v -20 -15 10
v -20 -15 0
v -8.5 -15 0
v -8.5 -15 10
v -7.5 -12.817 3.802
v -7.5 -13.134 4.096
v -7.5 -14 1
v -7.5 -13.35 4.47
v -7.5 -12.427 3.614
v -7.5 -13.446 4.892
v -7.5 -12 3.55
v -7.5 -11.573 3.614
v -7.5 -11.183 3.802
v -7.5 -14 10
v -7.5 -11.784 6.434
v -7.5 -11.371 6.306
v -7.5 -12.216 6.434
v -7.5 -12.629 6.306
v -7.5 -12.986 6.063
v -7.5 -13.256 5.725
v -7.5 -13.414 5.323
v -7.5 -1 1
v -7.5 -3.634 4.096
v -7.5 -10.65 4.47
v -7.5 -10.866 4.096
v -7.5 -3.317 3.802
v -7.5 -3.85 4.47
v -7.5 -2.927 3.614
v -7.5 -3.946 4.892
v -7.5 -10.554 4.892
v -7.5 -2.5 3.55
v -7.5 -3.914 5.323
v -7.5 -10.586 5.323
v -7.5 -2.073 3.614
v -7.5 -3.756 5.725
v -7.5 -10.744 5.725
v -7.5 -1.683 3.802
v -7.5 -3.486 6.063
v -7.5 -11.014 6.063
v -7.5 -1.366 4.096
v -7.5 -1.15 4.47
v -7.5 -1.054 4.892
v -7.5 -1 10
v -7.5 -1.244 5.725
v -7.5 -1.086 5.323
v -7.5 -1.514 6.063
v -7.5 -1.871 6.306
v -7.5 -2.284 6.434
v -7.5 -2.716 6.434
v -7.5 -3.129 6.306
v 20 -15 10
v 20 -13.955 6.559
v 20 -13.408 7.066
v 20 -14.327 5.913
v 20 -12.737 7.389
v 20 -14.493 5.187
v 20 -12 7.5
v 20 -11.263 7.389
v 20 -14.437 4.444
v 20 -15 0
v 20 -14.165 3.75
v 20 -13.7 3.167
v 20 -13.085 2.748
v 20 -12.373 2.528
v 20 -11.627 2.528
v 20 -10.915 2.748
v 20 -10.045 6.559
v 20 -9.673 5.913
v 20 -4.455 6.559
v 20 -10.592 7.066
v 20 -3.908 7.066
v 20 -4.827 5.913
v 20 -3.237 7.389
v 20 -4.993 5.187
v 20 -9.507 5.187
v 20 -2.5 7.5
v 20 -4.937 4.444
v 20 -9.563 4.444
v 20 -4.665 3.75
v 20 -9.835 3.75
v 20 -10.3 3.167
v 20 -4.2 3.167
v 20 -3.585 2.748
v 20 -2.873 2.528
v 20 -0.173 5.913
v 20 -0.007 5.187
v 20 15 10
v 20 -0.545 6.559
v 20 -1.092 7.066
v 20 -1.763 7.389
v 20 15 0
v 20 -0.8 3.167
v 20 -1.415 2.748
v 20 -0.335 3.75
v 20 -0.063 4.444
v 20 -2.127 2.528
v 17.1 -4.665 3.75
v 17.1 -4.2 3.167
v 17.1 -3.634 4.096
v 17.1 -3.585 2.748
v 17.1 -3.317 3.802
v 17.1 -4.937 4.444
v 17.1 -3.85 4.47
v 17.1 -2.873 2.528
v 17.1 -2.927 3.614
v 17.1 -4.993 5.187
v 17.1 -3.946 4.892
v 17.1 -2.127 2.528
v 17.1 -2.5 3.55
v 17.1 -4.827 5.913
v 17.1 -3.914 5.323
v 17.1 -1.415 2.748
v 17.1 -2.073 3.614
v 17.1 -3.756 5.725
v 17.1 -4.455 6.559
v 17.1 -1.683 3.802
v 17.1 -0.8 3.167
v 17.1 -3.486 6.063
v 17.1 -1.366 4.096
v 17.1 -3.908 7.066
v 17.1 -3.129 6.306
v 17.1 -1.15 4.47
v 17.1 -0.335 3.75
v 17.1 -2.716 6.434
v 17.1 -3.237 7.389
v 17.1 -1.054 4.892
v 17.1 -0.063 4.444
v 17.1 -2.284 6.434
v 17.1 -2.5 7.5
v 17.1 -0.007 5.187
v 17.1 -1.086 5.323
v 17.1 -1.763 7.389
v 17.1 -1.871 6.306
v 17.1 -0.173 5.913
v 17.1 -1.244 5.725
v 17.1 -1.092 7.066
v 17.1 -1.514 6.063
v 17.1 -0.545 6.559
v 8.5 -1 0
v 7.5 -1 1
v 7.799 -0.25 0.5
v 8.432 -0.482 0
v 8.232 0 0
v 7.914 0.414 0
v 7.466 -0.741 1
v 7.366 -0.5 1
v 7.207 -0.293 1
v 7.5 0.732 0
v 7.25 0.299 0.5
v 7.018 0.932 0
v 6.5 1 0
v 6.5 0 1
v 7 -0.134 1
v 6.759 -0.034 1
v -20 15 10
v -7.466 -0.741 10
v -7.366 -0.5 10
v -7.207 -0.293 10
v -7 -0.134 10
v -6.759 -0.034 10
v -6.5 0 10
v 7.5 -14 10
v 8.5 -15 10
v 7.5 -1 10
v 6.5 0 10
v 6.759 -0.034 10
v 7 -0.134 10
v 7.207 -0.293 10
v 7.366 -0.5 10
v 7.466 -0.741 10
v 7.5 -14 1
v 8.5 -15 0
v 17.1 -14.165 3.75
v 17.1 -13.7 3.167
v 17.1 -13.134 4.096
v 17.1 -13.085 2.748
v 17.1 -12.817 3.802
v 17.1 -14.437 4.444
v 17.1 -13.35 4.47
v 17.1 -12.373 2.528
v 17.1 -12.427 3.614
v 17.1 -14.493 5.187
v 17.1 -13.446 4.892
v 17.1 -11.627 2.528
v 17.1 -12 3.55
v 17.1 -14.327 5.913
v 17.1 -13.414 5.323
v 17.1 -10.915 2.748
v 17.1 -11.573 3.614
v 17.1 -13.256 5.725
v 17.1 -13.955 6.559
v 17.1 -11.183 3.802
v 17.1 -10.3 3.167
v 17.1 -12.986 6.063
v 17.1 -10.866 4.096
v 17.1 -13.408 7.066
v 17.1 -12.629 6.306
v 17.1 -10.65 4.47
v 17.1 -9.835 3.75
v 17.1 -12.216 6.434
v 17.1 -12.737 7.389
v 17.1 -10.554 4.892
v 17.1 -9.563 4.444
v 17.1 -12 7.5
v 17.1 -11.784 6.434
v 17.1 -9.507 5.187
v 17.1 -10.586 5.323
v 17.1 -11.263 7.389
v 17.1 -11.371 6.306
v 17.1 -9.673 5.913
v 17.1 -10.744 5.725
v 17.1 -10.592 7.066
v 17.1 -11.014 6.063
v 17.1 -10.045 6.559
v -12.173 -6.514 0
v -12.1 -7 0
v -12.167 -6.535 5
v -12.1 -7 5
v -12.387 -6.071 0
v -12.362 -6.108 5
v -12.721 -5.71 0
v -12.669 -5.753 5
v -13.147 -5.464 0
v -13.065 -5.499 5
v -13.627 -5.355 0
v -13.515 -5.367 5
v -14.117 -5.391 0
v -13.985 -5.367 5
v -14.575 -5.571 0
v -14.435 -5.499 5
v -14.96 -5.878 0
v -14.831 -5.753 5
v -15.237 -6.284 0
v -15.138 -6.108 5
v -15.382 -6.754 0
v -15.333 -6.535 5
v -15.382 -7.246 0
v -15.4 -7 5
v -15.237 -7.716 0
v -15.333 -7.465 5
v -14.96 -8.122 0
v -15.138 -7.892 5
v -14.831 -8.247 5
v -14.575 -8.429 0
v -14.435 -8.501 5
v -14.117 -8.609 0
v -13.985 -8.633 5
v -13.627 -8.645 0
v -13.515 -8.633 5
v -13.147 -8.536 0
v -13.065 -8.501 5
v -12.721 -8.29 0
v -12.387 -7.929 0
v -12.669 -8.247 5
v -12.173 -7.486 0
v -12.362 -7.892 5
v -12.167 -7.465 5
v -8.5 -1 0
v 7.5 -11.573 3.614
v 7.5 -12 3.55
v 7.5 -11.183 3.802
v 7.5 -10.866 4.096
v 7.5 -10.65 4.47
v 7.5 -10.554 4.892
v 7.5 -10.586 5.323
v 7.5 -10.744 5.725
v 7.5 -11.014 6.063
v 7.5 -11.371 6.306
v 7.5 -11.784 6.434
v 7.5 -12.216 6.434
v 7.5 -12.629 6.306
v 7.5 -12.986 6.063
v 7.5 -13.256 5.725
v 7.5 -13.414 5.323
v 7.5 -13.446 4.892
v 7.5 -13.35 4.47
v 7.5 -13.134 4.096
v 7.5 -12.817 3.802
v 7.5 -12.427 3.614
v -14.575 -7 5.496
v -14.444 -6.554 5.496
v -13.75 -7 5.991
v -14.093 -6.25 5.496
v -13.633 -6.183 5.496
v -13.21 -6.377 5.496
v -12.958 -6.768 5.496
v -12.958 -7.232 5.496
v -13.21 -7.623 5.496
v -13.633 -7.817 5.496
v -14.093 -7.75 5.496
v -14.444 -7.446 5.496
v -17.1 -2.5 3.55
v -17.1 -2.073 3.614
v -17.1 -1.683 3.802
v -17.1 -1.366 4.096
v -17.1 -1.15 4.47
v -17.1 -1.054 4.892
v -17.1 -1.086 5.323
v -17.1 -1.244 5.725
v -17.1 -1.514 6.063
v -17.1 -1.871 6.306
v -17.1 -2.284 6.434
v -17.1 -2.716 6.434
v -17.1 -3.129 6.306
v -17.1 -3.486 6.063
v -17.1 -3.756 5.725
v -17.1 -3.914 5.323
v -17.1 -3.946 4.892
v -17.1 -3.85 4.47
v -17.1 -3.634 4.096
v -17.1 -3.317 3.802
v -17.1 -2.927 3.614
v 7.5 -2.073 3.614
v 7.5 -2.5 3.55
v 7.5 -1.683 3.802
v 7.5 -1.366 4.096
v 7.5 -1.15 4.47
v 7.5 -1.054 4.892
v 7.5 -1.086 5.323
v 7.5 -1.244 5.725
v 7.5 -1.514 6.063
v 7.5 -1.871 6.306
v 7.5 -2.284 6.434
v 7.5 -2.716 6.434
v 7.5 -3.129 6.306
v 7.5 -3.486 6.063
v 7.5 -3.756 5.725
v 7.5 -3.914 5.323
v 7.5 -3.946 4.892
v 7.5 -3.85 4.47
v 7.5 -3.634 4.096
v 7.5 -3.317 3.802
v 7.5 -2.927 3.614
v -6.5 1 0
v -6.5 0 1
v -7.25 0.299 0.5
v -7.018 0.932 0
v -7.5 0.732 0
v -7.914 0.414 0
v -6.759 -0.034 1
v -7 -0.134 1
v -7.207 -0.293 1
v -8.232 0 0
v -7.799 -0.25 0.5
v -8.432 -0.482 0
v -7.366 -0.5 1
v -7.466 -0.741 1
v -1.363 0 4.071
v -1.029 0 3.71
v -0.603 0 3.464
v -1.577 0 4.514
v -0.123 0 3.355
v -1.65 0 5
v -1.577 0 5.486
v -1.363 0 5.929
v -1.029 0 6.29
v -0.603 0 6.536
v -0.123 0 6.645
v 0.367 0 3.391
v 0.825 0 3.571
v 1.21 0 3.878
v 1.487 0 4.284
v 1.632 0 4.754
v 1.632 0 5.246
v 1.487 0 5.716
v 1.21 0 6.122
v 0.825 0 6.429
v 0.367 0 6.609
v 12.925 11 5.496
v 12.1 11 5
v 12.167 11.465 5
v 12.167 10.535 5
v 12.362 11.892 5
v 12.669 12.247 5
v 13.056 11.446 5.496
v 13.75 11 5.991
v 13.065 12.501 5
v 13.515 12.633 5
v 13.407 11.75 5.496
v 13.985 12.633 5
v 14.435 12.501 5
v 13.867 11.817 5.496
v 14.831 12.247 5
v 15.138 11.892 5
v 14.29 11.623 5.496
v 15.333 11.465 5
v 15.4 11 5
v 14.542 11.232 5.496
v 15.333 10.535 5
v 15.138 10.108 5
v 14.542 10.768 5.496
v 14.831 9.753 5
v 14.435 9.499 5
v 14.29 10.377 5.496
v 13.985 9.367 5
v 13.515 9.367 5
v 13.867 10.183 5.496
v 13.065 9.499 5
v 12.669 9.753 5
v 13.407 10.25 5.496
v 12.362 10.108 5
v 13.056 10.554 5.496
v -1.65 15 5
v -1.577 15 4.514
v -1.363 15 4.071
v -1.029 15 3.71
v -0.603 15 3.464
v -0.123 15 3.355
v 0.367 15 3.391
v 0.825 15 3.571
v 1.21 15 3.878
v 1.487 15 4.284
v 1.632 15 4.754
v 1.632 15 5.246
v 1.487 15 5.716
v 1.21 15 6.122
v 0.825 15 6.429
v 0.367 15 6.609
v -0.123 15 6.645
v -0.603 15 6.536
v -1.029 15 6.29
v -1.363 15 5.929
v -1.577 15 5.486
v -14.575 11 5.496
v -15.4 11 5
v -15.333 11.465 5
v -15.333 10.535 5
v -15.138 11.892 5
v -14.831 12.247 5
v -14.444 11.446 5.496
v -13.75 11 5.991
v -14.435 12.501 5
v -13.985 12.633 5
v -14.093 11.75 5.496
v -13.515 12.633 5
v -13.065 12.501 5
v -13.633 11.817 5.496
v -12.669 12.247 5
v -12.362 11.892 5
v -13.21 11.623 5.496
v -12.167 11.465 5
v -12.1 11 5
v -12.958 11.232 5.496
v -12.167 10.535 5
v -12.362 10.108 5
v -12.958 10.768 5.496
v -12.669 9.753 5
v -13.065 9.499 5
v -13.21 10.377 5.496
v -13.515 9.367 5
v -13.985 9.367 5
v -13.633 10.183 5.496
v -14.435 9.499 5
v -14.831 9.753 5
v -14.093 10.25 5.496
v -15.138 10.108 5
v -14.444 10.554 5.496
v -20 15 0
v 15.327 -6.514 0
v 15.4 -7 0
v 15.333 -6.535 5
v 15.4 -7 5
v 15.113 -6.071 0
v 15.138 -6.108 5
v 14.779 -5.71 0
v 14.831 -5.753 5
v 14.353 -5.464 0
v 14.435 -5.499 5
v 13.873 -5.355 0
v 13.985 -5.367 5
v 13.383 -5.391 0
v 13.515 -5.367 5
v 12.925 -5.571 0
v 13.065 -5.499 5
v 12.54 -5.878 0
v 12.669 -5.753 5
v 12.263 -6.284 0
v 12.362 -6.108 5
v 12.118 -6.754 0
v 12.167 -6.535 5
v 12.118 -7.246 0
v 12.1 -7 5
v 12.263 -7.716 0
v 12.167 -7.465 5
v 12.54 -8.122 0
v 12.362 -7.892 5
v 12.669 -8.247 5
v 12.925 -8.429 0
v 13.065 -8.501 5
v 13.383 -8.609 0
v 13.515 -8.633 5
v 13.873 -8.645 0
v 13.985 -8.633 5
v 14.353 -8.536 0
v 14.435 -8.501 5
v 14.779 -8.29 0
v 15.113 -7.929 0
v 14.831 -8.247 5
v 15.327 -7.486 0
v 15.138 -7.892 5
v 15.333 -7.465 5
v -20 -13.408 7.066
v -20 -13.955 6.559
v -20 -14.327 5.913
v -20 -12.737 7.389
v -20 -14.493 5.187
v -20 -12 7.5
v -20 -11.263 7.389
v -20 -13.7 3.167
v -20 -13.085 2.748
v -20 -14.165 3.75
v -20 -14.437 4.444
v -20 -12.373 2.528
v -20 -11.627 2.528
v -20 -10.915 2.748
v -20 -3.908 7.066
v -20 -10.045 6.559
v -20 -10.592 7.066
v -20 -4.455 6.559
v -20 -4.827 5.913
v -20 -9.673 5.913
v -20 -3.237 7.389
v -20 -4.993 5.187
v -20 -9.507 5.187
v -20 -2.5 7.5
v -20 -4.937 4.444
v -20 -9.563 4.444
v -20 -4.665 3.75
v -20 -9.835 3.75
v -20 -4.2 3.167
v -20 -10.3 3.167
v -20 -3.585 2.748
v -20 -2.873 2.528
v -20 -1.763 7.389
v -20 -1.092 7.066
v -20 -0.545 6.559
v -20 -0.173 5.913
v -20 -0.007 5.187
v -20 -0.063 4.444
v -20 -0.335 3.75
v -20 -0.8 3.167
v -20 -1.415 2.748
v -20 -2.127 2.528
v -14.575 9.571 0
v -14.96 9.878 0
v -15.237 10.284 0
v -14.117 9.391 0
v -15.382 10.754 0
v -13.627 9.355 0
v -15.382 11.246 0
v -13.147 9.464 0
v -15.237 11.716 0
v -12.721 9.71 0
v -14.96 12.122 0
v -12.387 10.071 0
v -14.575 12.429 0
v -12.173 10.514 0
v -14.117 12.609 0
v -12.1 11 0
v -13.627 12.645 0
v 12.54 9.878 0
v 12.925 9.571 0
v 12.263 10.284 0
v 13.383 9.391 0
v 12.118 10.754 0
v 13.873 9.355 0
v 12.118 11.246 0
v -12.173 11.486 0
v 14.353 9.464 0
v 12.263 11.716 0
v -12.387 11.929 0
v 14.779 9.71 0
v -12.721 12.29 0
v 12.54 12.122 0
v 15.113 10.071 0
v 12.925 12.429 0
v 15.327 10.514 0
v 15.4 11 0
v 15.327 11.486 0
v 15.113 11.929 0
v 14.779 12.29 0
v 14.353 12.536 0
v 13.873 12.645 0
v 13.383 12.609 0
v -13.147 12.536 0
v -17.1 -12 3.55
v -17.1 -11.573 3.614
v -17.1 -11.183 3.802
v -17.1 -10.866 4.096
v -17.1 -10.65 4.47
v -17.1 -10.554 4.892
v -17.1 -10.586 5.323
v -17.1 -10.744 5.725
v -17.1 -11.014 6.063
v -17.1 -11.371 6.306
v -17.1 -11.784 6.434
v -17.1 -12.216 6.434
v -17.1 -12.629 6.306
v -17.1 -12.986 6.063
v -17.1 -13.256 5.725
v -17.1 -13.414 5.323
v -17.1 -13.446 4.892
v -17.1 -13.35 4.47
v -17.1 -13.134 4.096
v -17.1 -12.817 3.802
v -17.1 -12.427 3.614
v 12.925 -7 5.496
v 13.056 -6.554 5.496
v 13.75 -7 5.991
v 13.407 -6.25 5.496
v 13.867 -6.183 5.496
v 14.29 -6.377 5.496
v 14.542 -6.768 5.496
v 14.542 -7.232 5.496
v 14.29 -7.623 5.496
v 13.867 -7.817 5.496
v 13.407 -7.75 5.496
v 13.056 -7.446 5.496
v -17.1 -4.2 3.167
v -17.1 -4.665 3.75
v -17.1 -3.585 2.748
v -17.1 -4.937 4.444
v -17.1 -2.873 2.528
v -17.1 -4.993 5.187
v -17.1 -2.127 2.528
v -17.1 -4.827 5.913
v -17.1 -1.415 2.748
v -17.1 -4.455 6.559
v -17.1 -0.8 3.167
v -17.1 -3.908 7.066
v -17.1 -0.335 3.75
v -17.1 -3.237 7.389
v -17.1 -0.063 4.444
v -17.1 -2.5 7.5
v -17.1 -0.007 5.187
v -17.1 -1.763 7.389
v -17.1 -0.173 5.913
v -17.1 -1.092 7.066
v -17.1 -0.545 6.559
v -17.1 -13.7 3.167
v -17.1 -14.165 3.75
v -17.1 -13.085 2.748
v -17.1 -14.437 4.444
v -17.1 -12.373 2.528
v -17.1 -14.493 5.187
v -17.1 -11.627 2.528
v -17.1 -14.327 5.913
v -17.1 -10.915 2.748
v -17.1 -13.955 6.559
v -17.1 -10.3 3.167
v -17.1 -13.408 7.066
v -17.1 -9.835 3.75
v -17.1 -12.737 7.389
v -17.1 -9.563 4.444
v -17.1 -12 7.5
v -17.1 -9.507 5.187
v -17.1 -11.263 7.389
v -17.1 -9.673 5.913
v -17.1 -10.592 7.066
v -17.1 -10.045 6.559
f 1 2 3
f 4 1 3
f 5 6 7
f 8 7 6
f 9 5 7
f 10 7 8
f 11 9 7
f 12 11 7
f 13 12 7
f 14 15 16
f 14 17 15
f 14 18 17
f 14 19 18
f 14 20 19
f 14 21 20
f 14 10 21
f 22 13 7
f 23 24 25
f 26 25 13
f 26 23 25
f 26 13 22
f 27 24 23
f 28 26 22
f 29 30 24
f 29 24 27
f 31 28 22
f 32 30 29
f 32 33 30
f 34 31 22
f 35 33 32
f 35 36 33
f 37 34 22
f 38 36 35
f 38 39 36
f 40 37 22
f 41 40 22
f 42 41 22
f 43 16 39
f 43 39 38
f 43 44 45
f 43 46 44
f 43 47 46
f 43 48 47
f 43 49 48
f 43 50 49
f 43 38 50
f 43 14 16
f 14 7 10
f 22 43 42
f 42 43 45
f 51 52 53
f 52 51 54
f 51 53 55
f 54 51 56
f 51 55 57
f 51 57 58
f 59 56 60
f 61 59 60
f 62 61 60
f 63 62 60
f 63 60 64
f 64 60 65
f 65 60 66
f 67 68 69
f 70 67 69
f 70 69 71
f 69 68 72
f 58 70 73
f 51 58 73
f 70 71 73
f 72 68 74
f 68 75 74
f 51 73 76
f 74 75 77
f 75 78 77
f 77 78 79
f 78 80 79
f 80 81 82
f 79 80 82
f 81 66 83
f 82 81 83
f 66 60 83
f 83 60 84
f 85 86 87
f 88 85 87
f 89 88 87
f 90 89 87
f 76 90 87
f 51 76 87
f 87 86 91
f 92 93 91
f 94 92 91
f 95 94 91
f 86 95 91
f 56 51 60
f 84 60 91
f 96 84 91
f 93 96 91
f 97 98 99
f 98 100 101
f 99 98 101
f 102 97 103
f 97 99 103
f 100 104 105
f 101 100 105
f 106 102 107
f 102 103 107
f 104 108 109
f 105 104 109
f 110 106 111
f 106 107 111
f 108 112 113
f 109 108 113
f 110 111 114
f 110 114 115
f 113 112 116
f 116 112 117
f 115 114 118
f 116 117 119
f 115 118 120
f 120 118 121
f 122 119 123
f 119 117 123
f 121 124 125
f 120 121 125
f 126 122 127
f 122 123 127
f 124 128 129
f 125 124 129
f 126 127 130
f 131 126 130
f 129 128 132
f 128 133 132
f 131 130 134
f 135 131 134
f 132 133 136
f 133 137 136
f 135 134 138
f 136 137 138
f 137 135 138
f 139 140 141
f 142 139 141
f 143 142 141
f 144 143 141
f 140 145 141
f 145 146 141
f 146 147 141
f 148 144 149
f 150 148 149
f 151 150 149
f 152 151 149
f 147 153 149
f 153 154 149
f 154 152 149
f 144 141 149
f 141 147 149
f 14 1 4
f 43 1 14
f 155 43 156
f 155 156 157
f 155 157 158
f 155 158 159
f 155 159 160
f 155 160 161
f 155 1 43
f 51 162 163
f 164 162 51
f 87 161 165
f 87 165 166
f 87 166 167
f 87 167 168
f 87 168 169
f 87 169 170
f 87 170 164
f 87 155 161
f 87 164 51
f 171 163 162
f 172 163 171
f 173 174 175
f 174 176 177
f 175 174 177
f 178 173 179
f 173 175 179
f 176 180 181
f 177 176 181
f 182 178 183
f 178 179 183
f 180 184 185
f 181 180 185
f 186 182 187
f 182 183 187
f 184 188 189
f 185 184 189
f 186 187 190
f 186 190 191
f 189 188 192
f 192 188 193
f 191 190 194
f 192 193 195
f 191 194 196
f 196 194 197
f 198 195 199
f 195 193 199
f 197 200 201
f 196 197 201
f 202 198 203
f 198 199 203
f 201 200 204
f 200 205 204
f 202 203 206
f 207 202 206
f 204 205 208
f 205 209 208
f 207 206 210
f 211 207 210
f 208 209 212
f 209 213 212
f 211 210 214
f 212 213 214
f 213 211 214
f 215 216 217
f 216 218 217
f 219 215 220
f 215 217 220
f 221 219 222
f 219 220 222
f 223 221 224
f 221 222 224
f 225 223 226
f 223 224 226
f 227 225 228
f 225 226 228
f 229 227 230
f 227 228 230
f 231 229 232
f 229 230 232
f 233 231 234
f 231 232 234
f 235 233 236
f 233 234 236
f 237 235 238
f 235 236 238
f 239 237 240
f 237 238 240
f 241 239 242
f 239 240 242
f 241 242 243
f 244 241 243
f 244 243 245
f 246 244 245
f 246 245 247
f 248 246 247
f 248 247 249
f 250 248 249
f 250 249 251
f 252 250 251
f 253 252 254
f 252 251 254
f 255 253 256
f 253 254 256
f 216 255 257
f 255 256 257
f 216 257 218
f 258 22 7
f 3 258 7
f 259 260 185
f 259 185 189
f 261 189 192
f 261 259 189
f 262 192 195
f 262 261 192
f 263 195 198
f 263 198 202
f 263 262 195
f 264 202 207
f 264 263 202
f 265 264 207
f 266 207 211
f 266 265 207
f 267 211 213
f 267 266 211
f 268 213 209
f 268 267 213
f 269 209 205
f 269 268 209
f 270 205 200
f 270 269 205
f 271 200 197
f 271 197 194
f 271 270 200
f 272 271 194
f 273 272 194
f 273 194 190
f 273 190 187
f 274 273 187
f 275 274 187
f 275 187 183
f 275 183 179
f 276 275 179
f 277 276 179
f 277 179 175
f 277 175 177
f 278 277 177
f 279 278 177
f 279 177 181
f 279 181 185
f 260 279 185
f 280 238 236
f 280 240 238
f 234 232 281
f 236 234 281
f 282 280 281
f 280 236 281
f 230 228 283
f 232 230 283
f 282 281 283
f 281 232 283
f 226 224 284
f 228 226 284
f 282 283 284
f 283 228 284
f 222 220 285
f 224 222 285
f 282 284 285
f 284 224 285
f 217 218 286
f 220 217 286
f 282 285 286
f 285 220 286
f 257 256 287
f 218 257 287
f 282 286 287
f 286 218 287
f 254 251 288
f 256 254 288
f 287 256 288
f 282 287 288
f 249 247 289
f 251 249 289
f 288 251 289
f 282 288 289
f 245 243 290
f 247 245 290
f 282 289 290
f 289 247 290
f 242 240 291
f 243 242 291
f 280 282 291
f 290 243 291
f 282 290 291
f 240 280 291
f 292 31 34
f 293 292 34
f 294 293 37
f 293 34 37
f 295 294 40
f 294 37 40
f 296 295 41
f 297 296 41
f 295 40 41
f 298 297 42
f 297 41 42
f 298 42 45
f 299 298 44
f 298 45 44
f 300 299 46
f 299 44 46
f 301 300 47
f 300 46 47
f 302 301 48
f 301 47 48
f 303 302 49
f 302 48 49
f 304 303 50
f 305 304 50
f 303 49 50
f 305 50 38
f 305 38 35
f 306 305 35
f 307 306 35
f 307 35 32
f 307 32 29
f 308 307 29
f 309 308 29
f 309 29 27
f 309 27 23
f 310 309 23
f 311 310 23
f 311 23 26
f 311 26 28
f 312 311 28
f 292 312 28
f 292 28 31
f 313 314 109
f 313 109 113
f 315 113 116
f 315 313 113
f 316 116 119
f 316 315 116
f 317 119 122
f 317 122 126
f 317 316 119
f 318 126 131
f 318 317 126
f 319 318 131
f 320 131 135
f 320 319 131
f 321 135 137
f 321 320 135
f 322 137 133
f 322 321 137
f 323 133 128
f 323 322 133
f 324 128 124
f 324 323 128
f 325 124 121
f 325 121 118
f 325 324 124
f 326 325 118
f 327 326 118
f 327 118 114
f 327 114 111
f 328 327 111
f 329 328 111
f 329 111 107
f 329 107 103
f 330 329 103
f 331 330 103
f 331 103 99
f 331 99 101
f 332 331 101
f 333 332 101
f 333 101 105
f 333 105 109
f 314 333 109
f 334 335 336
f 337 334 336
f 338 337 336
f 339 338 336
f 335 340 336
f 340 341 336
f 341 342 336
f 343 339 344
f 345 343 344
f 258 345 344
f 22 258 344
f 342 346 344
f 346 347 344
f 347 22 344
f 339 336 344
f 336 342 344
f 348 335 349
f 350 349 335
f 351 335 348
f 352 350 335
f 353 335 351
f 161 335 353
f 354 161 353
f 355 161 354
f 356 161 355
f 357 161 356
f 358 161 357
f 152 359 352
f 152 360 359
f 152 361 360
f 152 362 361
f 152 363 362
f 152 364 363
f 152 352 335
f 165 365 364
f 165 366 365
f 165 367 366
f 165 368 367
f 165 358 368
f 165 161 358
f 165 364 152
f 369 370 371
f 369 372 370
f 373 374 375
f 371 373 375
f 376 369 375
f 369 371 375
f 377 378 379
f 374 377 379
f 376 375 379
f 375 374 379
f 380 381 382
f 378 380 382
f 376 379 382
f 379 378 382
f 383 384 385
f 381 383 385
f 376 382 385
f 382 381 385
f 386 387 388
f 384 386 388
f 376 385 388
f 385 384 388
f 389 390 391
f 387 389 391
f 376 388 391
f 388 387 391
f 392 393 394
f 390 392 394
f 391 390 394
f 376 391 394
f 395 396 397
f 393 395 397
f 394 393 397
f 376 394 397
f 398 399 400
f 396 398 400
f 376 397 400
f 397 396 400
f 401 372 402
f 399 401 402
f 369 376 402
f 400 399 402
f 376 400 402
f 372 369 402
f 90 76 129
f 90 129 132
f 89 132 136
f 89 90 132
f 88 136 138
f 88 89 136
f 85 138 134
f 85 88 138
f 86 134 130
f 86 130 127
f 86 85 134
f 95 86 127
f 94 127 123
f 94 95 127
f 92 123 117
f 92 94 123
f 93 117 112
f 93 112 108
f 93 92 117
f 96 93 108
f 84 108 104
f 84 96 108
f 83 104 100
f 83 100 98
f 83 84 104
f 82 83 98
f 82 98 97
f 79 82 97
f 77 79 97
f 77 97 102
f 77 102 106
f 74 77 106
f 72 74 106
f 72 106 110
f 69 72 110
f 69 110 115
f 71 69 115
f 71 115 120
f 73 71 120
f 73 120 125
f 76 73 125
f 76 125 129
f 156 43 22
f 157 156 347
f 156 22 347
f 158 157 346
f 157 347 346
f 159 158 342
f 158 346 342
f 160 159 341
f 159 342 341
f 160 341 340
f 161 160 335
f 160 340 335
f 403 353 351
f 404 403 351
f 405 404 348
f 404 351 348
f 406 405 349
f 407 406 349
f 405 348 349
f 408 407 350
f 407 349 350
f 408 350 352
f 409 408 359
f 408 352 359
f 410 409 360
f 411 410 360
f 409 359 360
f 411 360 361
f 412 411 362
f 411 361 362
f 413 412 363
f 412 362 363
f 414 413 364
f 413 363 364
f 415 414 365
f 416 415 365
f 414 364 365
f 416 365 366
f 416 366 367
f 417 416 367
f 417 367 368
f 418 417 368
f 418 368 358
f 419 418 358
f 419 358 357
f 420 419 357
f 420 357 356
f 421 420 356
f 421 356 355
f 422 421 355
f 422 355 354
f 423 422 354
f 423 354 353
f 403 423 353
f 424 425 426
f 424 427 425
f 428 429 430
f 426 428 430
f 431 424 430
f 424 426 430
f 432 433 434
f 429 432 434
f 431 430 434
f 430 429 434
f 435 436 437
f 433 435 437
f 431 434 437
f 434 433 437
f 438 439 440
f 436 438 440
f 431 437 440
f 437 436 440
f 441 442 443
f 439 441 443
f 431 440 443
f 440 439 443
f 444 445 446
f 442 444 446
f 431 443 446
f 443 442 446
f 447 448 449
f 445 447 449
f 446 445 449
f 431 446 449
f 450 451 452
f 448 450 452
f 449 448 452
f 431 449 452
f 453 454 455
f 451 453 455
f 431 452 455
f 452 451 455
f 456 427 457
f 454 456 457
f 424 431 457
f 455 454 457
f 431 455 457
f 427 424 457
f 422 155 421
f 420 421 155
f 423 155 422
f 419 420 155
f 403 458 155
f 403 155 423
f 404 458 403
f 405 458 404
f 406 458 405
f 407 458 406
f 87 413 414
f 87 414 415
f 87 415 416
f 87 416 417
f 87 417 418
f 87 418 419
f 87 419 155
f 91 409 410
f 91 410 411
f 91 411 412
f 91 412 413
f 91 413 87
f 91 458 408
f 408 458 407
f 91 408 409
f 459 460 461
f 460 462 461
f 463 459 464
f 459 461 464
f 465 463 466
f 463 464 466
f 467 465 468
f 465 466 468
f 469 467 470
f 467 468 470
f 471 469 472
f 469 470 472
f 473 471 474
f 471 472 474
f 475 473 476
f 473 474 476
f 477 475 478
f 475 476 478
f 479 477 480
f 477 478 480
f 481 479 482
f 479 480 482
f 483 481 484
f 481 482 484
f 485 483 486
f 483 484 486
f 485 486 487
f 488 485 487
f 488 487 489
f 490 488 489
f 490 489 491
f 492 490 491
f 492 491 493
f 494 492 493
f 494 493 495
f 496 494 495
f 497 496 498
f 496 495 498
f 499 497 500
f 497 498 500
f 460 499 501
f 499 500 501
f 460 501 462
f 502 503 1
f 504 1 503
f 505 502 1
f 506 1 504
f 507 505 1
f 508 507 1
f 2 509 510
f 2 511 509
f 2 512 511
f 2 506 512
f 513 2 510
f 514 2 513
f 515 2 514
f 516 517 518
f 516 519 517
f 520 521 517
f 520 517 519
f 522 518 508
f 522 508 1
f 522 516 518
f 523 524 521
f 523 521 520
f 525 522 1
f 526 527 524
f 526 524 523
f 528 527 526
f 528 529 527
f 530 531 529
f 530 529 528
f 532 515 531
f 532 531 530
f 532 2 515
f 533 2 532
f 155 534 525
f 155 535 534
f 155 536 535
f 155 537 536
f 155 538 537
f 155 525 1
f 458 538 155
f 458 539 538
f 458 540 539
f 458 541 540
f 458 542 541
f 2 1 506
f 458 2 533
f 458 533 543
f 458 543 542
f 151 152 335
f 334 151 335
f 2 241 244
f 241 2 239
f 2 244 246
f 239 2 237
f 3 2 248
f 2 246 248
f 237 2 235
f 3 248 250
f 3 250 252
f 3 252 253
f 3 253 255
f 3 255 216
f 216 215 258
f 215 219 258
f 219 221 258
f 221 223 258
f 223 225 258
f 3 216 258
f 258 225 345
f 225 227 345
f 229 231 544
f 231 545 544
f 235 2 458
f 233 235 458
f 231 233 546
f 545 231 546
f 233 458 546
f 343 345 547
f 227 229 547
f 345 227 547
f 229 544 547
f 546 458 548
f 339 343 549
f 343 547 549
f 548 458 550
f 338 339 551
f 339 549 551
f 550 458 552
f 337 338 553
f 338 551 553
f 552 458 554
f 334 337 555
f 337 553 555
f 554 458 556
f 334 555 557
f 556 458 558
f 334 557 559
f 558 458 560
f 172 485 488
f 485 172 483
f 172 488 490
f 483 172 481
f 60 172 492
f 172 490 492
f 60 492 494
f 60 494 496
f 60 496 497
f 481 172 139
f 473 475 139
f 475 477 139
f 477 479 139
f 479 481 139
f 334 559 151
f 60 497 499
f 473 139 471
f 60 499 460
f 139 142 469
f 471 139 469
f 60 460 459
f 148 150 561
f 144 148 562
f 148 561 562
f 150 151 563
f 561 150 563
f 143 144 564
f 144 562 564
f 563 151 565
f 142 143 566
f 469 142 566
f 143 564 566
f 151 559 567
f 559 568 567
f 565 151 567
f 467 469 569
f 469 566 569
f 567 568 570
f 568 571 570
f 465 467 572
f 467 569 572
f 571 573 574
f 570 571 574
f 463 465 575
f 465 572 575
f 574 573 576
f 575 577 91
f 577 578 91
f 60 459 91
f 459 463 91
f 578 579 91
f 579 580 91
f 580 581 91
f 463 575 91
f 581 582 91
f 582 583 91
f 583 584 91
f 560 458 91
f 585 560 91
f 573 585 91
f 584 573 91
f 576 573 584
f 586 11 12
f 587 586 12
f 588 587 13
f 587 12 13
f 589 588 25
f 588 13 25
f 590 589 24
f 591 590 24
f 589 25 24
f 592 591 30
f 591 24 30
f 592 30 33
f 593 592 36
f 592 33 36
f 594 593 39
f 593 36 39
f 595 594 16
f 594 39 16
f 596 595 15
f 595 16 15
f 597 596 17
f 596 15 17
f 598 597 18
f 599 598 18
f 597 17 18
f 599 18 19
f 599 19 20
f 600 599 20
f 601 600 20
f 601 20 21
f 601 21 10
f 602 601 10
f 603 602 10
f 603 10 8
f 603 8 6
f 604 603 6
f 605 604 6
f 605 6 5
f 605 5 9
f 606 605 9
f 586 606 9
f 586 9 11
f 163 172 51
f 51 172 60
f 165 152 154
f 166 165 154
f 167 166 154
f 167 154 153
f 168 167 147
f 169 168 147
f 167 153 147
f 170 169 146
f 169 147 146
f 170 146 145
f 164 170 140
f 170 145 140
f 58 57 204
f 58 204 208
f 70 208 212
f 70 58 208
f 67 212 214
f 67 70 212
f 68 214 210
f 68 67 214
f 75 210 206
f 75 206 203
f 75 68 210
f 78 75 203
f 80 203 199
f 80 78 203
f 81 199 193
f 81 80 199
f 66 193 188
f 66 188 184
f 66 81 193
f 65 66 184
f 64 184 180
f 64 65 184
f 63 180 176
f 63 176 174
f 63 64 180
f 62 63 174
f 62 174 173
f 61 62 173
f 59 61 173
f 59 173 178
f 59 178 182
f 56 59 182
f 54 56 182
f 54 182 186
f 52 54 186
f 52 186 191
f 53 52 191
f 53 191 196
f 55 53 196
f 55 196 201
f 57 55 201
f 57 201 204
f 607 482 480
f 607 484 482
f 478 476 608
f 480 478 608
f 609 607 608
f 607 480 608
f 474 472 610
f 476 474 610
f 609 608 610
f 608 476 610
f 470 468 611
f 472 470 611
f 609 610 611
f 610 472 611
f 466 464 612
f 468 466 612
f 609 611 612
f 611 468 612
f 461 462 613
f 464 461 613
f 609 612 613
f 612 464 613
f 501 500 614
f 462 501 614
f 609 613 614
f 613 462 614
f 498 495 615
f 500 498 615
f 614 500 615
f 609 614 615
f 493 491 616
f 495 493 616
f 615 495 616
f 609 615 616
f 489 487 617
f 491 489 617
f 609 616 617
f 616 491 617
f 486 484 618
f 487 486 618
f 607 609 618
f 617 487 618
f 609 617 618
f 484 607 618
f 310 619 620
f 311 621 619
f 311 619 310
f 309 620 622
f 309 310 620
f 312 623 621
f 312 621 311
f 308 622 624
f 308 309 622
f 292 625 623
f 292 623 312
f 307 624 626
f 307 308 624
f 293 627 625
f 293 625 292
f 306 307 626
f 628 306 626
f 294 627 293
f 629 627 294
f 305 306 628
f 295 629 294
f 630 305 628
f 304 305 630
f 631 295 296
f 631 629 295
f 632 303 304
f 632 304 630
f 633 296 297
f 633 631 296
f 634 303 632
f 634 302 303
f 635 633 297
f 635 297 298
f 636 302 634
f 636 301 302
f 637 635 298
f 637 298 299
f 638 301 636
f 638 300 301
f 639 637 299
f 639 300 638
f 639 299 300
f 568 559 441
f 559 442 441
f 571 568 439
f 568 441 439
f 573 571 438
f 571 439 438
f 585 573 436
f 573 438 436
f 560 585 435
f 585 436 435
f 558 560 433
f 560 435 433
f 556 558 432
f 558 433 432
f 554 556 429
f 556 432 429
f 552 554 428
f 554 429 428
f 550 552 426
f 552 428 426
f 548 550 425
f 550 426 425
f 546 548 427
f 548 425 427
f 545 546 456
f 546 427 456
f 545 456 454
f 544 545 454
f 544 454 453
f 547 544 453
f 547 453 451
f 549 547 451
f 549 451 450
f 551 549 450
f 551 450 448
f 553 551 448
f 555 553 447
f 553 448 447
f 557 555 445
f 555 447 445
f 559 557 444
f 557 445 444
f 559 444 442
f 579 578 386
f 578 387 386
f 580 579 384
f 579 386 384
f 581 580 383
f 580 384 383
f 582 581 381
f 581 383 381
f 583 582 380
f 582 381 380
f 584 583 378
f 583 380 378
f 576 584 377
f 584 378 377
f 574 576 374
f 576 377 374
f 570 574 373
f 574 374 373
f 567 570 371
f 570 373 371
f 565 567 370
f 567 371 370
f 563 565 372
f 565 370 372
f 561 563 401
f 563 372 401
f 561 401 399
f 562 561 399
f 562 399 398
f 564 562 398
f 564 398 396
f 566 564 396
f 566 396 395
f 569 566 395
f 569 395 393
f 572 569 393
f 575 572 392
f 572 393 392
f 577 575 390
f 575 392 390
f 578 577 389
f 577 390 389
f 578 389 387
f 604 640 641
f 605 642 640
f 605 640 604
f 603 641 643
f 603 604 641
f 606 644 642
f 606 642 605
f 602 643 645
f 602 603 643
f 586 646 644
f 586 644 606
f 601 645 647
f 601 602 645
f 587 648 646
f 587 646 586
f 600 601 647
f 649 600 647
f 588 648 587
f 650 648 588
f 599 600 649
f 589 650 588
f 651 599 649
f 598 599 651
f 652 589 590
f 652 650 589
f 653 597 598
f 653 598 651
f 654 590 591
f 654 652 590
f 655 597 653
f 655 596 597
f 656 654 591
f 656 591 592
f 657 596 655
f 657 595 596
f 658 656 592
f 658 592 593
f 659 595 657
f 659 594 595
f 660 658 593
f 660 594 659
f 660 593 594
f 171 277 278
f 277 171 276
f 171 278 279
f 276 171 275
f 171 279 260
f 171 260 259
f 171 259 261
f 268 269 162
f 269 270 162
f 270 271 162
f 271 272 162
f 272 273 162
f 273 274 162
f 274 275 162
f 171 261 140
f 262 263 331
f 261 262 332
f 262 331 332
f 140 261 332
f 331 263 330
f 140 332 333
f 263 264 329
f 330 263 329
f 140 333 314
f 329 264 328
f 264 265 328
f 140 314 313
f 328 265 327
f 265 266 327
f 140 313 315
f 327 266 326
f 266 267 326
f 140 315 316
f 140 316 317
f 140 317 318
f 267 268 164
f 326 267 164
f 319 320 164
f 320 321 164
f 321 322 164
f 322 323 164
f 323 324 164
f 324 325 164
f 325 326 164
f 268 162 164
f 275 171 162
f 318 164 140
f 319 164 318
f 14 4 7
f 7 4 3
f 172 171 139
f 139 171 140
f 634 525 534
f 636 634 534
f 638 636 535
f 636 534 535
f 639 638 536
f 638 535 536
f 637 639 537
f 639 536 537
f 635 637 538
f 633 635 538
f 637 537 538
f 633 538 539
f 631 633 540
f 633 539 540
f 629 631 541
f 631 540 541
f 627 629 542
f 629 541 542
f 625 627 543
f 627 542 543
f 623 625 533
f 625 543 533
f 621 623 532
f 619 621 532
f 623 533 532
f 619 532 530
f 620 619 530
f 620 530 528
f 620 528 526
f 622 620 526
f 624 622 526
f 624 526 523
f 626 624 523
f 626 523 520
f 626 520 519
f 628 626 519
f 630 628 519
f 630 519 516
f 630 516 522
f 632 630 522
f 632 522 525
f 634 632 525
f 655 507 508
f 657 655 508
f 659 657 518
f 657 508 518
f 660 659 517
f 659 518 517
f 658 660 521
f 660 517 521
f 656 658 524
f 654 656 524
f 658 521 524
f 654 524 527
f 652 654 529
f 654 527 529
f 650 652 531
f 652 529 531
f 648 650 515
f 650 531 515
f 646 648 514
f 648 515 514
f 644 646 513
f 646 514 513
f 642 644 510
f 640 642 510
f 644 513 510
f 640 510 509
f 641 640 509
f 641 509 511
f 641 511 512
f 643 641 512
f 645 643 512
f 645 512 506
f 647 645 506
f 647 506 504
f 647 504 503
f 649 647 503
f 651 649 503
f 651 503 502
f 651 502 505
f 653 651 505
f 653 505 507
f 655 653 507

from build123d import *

# Parameters (mm, degrees)
SKETCH1_W                                            = 40
SKETCH1_H                                            = 30
BOSS_EXTRUDE1_DEPTH                                  = 10
SKETCH2_W                                            = 15
SKETCH2_H                                            = 15
CUT_EXTRUDE1_DEPTH                                   = 27.925824036
CBORE_FOR_M2_5_SLOTTED_CHEESE_HEAD_SCREW_D           = 2.9
CBORE_FOR_M2_5_SLOTTED_CHEESE_HEAD_SCREW_DEPTH       = 12.5
CBORE_FOR_M2_5_SLOTTED_CHEESE_HEAD_SCREW_CBORE_D     = 5
CBORE_FOR_M2_5_SLOTTED_CHEESE_HEAD_SCREW_CBORE_DEPTH = 2.9
M4_TAPPED_HOLE1_D                                    = 3.3
M4_TAPPED_HOLE1_DEPTH                                = 5
M4_TAPPED_HOLE1_TIP                                  = 0.991420021
FILLET1_R                                            = 1
CHAMFER1_SIZE                                        = 1
CHAMFER2_SIZE                                        = 1
M4_TAPPED_HOLE2_D                                    = 3.3


with BuildPart() as part:
    # Sketch1 → Boss-Extrude1 (new body)
    with BuildSketch(Plane.XY):
        Rectangle(SKETCH1_W, SKETCH1_H)
    extrude(amount=BOSS_EXTRUDE1_DEPTH)

    # Sketch2 → Cut-Extrude1 (cut, through all)
    with BuildSketch(Plane.XY.offset(10)):
        with Locations((0, -7.5)):
            Rectangle(SKETCH2_W, SKETCH2_H)
    extrude(amount=-CUT_EXTRUDE1_DEPTH, mode=Mode.SUBTRACT)

    # CBORE for M2.5 Slotted cheese head screws2
    with Locations(Plane.ZY.offset(20)):
        with Locations((5, -2.5), (5, -12)):
            cbore_for_m2_5_slotted_cheese_head_screw = CounterBoreHole(CBORE_FOR_M2_5_SLOTTED_CHEESE_HEAD_SCREW_D / 2, CBORE_FOR_M2_5_SLOTTED_CHEESE_HEAD_SCREW_CBORE_D / 2, CBORE_FOR_M2_5_SLOTTED_CHEESE_HEAD_SCREW_CBORE_DEPTH, depth=CBORE_FOR_M2_5_SLOTTED_CHEESE_HEAD_SCREW_DEPTH)

    # Mirror1: CBORE for M2.5 Slotted cheese head screws2 across plane
    add(cbore_for_m2_5_slotted_cheese_head_screw.mirror(Plane(origin=(0, 0, 0), x_dir=(0, 0, 1), z_dir=(1, 0, 0))), mode=Mode.SUBTRACT)

    # M4 Tapped Hole1
    with Locations(Plane(origin=(0, 0, 0), x_dir=(-1, 0, 0), z_dir=(0, 0, -1))):
        with Locations((-13.75, -7), (-13.75, 11), (13.75, 11), (13.75, -7)):
            Hole(M4_TAPPED_HOLE1_D / 2, depth=M4_TAPPED_HOLE1_DEPTH)
            with Locations((0, 0, -(M4_TAPPED_HOLE1_DEPTH + M4_TAPPED_HOLE1_TIP / 2))):  # 118° drill point
                Cone(0, M4_TAPPED_HOLE1_D / 2, M4_TAPPED_HOLE1_TIP, mode=Mode.SUBTRACT)

    # Fillet1
    fillet1_edges = [part.edges().sort_by_distance(p)[0] for p in [
        (7.5, 0, 5),
        (-7.5, 0, 5),
    ]]
    fillet(fillet1_edges, radius=FILLET1_R)

    # Chamfer1
    chamfer1_edges = [part.edges().sort_by_distance(p)[0] for p in [
        (7.5, -15, 5),
        (-7.5, -15, 5),
    ]]
    chamfer(chamfer1_edges, length=CHAMFER1_SIZE)

    # Chamfer2
    chamfer2_edges = [part.edges().sort_by_distance(p)[0] for p in [
        (7.5, -7.5, 0),
        (-7.5, -7.5, 0),
        (7.207106781, -0.292893219, 0),
        (-7.207106781, -0.292893219, 0),
        (0, 0, 0),
    ]]
    chamfer(chamfer2_edges, length=CHAMFER2_SIZE)

    # M4 Tapped Hole2 (through all)
    with Locations(Plane(origin=(0, 15, 0), x_dir=(1, 0, 0), z_dir=(0, 1, 0))):
        with Locations((0, -5)):
            Hole(M4_TAPPED_HOLE2_D / 2)


solid = part.part
